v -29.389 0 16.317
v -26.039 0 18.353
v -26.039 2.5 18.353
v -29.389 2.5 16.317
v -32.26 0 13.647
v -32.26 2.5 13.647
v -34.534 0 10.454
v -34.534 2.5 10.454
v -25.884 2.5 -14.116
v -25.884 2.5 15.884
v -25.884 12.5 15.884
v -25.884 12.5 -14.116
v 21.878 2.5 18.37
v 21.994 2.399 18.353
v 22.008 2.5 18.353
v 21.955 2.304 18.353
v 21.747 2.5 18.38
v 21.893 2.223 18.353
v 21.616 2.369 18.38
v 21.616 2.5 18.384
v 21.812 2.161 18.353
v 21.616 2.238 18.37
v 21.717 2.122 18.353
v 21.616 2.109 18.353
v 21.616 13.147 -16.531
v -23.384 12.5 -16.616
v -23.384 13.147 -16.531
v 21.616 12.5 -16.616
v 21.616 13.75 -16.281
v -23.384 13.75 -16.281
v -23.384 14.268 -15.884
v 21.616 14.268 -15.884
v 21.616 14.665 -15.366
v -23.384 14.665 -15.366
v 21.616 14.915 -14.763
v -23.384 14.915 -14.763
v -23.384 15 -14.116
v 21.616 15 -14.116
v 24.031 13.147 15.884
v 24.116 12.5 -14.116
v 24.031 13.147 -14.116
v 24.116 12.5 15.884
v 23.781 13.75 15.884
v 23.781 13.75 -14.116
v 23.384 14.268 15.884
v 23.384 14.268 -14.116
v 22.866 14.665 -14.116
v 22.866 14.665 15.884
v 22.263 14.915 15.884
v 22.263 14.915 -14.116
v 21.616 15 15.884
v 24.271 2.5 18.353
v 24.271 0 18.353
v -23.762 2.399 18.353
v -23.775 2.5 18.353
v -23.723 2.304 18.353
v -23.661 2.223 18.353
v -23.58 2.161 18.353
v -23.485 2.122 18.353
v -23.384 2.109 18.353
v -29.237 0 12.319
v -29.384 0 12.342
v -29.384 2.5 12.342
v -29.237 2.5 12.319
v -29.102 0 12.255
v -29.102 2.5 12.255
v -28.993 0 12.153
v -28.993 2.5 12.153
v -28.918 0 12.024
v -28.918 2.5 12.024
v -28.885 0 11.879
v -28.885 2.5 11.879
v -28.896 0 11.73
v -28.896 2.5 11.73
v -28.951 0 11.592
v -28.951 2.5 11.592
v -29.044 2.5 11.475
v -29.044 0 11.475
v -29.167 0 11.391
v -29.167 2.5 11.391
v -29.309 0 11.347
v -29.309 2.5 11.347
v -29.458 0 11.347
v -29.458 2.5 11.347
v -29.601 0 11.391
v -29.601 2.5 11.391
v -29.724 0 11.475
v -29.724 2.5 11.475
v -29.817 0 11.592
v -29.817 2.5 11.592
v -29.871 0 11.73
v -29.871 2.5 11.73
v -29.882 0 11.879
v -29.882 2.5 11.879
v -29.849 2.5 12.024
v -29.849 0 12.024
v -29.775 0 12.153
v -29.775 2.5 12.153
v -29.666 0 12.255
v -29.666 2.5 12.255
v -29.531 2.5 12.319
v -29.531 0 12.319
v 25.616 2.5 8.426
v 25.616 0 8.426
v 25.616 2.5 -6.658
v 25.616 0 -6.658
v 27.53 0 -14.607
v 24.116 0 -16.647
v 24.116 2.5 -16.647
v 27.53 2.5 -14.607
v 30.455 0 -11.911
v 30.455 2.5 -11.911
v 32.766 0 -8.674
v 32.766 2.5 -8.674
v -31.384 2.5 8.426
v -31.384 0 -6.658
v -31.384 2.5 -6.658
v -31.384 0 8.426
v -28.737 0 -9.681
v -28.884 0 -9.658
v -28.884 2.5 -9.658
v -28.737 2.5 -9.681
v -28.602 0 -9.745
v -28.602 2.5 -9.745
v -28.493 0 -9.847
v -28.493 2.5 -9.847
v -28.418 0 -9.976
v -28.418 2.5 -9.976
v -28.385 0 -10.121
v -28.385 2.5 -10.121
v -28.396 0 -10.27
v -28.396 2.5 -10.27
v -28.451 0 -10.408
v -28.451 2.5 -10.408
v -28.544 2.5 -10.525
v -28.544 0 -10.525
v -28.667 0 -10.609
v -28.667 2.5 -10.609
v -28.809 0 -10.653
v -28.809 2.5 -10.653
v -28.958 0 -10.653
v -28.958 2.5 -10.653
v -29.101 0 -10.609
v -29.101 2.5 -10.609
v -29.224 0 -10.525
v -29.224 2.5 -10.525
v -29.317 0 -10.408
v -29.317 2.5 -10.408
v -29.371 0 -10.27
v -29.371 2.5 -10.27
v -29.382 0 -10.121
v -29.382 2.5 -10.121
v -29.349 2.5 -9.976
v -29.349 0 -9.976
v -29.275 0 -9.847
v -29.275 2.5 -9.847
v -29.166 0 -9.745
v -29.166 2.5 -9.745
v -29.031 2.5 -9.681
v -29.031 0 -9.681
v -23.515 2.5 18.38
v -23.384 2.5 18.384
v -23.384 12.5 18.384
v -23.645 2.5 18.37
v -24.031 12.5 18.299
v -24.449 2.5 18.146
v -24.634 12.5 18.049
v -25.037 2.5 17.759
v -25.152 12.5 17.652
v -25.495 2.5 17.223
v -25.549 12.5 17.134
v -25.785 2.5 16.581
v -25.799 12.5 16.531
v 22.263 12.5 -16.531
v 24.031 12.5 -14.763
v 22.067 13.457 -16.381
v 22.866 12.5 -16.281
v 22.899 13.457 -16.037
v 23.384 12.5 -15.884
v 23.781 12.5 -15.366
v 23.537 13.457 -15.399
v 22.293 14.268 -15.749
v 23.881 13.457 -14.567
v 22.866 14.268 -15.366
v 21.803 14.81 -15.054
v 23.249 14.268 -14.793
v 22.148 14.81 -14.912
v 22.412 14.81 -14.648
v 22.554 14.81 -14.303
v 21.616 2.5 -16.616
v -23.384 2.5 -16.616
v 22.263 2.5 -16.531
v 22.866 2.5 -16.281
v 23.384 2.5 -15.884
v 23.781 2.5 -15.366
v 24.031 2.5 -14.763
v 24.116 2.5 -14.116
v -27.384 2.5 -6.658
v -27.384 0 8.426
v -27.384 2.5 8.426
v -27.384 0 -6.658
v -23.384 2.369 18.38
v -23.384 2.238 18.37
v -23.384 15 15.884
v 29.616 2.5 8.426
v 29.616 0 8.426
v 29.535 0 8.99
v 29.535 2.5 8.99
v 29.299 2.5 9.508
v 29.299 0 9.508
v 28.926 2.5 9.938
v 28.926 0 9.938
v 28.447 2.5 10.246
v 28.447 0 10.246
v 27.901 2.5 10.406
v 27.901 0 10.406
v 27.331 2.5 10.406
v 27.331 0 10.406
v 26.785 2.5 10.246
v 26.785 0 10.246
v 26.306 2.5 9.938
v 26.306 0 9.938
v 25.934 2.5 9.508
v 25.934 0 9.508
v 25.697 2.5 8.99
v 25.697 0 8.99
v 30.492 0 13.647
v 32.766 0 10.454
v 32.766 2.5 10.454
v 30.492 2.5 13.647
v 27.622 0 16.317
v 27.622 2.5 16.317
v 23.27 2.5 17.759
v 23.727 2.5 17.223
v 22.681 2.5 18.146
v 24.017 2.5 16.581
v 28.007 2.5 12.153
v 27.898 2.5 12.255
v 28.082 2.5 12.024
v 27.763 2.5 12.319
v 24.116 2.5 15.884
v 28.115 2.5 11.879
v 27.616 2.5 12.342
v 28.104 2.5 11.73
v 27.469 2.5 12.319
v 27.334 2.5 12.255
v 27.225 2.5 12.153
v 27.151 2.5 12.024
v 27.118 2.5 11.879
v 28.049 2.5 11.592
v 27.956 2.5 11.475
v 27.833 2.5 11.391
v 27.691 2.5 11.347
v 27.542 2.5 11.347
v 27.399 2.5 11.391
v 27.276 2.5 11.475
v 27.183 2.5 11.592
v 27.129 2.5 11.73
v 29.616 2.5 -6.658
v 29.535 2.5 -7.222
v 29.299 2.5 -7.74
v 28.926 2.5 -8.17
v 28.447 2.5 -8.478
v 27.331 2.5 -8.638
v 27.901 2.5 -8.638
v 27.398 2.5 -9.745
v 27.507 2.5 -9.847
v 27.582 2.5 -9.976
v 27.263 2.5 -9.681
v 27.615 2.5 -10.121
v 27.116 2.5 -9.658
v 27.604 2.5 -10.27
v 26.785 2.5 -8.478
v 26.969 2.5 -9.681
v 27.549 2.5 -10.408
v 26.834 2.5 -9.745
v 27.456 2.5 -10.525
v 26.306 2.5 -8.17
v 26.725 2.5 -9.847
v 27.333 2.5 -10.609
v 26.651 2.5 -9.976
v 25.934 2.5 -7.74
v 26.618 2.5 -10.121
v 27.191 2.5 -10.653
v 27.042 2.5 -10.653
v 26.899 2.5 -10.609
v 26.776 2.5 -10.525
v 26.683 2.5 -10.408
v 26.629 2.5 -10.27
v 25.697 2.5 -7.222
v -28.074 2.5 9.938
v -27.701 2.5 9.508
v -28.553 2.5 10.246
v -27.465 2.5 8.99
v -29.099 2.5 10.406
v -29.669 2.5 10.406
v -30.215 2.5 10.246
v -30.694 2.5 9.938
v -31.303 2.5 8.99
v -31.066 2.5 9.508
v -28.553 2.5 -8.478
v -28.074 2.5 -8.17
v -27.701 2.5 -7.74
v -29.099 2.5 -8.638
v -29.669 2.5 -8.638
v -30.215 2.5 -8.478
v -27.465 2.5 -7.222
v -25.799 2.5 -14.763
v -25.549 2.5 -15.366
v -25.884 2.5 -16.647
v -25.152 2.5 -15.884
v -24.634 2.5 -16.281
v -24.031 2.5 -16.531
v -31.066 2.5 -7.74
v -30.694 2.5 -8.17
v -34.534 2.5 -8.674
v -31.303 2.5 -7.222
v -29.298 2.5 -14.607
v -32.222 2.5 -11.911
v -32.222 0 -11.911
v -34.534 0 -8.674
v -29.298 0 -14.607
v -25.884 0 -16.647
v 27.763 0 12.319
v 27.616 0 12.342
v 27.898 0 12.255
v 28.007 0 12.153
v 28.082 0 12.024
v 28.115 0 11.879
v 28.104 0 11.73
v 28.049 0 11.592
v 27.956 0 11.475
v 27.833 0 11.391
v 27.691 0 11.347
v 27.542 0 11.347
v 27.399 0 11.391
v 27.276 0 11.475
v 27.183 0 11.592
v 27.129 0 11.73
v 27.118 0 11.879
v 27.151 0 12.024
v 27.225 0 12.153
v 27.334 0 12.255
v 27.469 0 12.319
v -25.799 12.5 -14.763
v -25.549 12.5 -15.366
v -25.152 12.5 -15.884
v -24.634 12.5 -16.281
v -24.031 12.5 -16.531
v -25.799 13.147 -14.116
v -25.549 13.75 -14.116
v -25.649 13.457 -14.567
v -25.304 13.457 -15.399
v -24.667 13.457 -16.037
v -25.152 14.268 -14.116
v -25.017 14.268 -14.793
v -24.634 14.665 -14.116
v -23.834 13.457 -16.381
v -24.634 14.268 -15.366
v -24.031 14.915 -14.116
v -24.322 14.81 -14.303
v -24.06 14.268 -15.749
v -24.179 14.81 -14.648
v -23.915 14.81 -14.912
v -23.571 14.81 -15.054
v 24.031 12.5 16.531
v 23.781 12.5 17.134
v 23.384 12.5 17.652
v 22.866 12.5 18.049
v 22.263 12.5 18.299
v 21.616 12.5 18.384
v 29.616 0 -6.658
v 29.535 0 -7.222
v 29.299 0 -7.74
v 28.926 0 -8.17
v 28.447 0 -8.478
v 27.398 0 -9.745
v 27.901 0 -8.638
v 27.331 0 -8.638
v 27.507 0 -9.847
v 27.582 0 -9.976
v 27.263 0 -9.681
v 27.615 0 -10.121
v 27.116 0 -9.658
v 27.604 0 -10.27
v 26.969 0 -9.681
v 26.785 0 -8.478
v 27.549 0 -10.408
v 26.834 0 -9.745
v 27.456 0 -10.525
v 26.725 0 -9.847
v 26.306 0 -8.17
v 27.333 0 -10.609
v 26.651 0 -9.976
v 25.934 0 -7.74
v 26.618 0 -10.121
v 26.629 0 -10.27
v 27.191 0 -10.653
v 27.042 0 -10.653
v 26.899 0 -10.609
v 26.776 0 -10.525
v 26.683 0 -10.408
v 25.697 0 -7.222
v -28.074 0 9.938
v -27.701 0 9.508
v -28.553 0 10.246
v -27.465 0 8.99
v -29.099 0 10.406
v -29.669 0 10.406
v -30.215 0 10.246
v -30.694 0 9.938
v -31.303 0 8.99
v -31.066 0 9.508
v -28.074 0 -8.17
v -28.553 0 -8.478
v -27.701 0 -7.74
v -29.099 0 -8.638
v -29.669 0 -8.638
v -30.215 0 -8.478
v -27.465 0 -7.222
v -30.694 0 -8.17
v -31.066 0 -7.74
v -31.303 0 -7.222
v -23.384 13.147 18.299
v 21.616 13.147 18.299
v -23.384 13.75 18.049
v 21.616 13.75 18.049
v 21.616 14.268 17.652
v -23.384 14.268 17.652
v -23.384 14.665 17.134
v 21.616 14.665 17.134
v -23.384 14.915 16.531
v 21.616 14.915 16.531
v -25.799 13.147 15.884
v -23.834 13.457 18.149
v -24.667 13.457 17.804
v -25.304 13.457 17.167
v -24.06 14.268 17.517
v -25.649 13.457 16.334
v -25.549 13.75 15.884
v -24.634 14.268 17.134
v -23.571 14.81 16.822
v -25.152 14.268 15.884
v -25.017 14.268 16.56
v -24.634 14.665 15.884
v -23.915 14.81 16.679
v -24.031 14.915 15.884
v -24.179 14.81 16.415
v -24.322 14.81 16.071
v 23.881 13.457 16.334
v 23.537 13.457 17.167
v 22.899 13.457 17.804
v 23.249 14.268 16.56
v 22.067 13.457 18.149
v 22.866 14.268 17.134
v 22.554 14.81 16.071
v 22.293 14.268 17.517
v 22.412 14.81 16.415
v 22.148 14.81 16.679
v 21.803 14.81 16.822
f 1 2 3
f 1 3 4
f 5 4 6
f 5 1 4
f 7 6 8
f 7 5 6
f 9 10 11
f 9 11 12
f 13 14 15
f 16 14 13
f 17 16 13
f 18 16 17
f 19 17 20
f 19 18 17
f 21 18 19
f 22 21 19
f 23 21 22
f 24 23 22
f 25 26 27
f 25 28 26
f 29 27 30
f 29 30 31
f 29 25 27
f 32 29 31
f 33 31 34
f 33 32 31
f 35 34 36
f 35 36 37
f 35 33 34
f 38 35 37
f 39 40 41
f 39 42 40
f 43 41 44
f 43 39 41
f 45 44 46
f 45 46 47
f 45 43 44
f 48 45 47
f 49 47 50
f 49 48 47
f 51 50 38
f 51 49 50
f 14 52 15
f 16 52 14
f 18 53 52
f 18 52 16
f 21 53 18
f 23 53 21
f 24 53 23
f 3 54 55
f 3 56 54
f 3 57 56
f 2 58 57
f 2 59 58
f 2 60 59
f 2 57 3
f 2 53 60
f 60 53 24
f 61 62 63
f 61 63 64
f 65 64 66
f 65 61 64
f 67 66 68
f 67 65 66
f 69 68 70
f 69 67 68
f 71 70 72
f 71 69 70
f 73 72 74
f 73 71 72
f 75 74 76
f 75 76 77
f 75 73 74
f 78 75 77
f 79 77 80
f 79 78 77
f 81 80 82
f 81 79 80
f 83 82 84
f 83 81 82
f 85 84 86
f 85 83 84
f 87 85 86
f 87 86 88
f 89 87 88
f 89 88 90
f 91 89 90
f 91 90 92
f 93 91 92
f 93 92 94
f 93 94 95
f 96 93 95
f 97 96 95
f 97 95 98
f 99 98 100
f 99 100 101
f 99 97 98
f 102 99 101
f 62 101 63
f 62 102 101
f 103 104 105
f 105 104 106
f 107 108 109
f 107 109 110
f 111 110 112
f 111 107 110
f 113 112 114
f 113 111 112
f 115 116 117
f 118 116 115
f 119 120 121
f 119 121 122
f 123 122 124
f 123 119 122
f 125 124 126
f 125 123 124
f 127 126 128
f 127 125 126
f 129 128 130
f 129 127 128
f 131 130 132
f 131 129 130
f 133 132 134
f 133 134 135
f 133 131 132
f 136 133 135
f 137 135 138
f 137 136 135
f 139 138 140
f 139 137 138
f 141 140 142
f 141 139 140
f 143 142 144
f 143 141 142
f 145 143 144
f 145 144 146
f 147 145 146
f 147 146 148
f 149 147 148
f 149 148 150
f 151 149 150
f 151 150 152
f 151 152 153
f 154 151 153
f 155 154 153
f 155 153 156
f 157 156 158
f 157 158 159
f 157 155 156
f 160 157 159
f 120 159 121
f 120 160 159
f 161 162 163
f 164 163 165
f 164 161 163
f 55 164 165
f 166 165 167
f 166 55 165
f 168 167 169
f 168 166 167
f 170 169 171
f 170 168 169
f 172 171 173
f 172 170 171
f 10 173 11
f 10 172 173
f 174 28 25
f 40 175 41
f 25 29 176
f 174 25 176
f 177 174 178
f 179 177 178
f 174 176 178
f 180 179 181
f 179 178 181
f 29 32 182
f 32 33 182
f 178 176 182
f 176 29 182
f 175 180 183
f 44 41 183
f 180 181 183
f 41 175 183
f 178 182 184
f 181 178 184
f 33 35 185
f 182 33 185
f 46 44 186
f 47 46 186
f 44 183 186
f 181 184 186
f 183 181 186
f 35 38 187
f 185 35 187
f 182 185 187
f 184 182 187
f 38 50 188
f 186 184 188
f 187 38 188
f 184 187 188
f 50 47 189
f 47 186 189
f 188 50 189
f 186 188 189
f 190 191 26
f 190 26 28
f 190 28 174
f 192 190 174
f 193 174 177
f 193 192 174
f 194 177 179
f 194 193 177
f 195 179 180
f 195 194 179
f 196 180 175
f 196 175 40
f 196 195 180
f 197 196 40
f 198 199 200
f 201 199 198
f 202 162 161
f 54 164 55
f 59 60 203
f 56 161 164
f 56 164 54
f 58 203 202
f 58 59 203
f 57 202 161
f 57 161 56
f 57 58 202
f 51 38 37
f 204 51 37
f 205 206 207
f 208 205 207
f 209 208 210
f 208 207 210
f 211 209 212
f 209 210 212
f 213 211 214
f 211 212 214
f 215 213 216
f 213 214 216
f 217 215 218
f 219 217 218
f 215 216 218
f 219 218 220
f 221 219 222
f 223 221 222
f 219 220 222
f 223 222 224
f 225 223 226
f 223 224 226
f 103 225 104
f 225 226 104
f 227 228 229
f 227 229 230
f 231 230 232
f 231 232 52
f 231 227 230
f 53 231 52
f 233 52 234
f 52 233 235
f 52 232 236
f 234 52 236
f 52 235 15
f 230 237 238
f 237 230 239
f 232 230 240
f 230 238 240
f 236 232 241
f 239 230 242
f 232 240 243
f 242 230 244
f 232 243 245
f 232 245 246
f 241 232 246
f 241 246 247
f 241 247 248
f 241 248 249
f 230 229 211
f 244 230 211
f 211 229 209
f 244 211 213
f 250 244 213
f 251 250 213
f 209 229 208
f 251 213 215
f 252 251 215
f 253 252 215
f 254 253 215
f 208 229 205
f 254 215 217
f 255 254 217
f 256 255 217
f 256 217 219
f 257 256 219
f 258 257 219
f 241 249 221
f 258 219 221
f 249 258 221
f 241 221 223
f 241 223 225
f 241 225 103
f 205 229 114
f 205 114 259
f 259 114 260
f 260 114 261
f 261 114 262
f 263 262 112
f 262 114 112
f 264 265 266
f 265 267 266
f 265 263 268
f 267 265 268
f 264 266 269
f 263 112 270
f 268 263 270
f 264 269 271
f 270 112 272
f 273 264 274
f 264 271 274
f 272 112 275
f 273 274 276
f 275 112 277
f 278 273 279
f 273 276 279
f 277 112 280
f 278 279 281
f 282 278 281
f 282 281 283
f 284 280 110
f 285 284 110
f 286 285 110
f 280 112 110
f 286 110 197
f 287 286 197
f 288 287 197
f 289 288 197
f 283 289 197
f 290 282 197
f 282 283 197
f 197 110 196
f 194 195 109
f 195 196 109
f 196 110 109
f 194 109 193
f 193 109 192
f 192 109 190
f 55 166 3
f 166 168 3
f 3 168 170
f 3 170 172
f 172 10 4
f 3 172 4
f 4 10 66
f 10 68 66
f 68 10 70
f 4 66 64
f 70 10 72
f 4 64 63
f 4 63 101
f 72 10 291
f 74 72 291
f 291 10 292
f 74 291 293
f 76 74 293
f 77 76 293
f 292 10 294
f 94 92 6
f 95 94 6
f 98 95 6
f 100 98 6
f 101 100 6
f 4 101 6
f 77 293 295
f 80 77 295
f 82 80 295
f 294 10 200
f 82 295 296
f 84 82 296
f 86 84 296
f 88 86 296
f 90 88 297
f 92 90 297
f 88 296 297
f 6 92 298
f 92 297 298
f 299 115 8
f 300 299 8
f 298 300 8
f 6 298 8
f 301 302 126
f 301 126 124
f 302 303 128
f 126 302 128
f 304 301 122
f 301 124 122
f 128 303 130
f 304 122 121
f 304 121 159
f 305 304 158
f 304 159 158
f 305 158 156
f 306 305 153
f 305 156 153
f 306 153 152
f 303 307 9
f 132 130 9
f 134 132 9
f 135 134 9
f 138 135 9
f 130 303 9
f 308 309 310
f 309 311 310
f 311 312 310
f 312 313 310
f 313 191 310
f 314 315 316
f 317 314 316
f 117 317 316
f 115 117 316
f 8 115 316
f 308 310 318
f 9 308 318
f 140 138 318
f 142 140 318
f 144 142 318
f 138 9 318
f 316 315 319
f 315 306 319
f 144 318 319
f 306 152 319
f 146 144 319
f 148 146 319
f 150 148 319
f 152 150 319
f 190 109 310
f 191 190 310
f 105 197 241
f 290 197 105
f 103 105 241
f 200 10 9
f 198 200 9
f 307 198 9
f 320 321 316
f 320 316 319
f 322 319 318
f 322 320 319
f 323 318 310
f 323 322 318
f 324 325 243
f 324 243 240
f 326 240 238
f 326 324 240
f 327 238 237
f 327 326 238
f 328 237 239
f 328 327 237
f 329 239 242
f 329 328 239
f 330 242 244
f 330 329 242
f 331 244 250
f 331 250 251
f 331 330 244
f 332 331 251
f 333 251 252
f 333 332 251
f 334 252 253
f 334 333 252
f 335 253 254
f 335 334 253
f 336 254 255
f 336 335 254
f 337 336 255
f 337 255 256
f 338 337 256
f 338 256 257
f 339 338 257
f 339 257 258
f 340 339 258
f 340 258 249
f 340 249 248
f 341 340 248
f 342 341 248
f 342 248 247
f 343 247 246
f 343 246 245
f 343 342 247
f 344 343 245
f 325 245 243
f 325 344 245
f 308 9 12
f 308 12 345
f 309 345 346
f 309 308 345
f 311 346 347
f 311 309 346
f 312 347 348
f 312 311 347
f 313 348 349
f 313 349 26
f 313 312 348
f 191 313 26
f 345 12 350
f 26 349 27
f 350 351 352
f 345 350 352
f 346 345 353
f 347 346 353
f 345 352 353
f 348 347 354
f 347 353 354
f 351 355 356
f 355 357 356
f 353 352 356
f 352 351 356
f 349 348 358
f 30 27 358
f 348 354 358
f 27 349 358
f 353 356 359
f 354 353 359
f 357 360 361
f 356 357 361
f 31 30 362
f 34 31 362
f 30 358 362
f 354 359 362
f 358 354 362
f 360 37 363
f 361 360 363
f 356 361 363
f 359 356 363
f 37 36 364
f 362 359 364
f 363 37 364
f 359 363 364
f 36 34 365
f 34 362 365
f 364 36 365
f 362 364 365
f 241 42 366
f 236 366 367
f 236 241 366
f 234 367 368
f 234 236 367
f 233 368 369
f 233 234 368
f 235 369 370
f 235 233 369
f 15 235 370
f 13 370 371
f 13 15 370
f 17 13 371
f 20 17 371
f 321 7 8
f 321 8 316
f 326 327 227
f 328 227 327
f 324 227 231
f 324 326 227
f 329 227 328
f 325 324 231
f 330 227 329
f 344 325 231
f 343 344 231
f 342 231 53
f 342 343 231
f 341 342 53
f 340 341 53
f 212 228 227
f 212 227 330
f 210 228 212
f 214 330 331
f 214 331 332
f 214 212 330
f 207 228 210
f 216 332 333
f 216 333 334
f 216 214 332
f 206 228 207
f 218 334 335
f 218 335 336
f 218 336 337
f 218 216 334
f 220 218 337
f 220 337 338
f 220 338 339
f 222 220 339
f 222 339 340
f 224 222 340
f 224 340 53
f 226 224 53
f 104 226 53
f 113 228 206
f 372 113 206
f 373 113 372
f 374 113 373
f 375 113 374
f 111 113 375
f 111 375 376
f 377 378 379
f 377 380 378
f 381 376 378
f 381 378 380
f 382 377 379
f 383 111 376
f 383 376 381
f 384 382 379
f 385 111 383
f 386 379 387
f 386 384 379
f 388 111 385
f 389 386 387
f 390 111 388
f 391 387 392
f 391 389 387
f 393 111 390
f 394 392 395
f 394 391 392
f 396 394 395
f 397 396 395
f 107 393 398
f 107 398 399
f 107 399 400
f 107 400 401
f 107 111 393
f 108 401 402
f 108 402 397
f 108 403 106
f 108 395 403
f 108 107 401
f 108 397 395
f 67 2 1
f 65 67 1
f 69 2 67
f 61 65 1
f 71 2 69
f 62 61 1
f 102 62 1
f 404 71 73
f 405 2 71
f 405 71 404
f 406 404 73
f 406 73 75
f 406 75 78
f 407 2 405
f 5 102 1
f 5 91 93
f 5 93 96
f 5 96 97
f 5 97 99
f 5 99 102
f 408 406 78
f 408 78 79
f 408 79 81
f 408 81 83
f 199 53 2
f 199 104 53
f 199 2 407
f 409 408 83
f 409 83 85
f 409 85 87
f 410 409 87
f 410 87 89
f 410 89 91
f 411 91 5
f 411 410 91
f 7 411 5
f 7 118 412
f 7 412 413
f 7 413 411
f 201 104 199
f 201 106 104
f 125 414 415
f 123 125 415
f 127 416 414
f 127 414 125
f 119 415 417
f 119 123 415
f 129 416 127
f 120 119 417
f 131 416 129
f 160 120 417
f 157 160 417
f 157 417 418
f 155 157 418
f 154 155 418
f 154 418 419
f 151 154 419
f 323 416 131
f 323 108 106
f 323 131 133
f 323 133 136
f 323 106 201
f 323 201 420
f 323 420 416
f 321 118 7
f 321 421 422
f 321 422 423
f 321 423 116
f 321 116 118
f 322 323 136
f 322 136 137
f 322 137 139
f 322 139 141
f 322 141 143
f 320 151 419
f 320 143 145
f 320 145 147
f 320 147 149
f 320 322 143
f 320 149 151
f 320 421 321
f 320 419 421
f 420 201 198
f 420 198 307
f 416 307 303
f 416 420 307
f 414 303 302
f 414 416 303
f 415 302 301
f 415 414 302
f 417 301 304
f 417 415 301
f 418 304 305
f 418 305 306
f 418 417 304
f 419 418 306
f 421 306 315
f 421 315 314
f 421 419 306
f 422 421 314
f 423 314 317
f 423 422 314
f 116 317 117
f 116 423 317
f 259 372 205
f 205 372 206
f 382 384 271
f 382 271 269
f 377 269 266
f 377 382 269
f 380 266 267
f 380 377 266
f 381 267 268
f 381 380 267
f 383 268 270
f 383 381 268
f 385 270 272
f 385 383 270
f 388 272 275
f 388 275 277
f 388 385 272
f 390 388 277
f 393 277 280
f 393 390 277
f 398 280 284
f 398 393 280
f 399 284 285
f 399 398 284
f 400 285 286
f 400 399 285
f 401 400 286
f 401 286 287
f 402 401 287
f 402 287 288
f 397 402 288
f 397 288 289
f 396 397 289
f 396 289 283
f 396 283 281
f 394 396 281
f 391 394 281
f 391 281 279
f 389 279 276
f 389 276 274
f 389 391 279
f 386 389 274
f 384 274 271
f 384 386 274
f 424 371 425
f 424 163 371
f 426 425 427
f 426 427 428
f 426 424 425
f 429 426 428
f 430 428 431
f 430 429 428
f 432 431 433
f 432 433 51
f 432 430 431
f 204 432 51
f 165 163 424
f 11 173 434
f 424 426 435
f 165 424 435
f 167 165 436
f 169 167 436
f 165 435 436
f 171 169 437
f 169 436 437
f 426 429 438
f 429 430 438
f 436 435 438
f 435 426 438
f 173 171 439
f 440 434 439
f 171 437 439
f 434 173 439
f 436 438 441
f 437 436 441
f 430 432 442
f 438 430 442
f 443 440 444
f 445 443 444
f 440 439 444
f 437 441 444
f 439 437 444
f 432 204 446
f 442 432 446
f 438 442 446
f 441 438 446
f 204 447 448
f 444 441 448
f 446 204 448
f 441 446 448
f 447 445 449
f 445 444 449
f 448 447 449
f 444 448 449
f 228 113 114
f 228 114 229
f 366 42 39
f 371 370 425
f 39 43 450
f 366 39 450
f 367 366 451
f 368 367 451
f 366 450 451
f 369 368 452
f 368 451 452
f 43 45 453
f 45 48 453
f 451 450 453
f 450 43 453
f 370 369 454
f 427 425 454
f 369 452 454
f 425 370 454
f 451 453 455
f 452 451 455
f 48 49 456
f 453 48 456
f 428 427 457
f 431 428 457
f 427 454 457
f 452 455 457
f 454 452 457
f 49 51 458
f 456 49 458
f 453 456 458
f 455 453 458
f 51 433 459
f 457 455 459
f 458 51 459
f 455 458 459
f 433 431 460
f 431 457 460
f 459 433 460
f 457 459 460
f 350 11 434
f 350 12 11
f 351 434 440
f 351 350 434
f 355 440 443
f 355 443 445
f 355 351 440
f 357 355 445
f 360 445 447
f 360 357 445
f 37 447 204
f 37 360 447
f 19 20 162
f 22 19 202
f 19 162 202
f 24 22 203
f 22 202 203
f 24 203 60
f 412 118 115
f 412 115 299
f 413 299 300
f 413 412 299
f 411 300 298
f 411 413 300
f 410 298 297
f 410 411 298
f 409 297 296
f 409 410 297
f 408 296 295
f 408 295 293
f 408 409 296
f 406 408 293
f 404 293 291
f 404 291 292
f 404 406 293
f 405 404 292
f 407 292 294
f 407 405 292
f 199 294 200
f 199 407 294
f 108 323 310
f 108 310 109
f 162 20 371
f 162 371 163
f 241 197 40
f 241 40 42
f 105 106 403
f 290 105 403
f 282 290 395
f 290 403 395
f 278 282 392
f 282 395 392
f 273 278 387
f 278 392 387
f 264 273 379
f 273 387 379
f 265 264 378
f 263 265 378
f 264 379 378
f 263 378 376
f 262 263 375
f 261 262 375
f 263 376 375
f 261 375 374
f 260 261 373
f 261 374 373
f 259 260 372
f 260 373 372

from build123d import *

# Parameters (mm, degrees)
BOSS_EXTRUDE2_DEPTH = 15
FILLET2_R           = 2.5
SKETCH3_R           = 0.5
BOSS_EXTRUDE4_DEPTH = 2.5


with BuildPart() as part:
    # Sketch1 → Boss-Extrude2 (new body)
    with BuildSketch(Plane(origin=(0, 0, 0), x_dir=(1, 0, 0), z_dir=(0, 1, 0))):
        with BuildLine():
            Line((-23.383883476, 16.616116524), (21.616116524, 16.616116524))
            ThreePointArc((21.616116524, 16.616116524), (23.383883476, 15.883883476), (24.116116524, 14.116116524))
            Line((24.116116524, 14.116116524), (24.116116524, -15.883883476))
            ThreePointArc((24.116116524, -15.883883476), (23.383883476, -17.651650429), (21.616116524, -18.383883476))
            Line((21.616116524, -18.383883476), (-23.383883476, -18.383883476))
            ThreePointArc((-23.383883476, -18.383883476), (-25.151650429, -17.651650429), (-25.883883476, -15.883883476))
            Line((-25.883883476, -15.883883476), (-25.883883476, 14.116116524))
            ThreePointArc((-25.883883476, 14.116116524), (-25.151650429, 15.883883476), (-23.383883476, 16.616116524))
        make_face()
    extrude(amount=BOSS_EXTRUDE2_DEPTH)

    # Fillet2
    fillet2_edges = [part.edges().sort_by_distance(p)[0] for p in [
        (-25.151650429, 15, 17.651650429),
        (-25.883883476, 0, 0.883883476),
        (-25.151650429, 0, -15.883883476),
        (-0.883883476, 15, 18.383883476),
        (23.383883476, 15, 17.651650429),
        (24.116116524, 15, 0.883883476),
        (23.383883476, 15, -15.883883476),
        (-0.883883476, 15, -16.616116524),
        (-25.151650429, 15, -15.883883476),
        (-25.883883476, 15, 0.883883476),
        (-0.883883476, 0, -16.616116524),
        (23.383883476, 0, -15.883883476),
        (24.116116524, 0, 0.883883476),
        (23.383883476, 0, 17.651650429),
        (-0.883883476, 0, 18.383883476),
        (-25.151650429, 0, 17.651650429),
    ]]
    fillet(fillet2_edges, radius=FILLET2_R)

    # Sketch3 → Boss-Extrude4 (add)
    with BuildSketch(Plane(origin=(0, 0, 0), x_dir=(1, 0, 0), z_dir=(0, 1, 0))):
        with BuildLine():
            Line((-25.883883476, 16.646945133), (24.116116524, 16.646945133))
            ThreePointArc((24.116116524, 16.646945133), (29.061870418, 13.334132498), (32.766116524, 8.674328862))
            Line((32.766116524, 8.674328862), (32.766116524, -10.453501419))
            ThreePointArc((32.766116524, -10.453501419), (29.124788001, -15.055056138), (24.271254893, -18.353054867))
            Line((24.271254893, -18.353054867), (-26.039021846, -18.353054867))
            ThreePointArc((-26.039021846, -18.353054867), (-30.892554954, -15.055056138), (-34.533883476, -10.453501419))
            Line((-34.533883476, -10.453501419), (-34.533883476, 8.674328862))
            ThreePointArc((-34.533883476, 8.674328862), (-30.829637371, 13.334132498), (-25.883883476, 16.646945133))
        make_face()
        with Locations(Location((-28.883883476, 10.158483361, 0), (0, 0, 270))):
            Circle(SKETCH3_R, mode=Mode.SUBTRACT)
        with Locations(Location((-29.383883476, -11.841516639, 0), (0, 0, 270))):
            Circle(SKETCH3_R, mode=Mode.SUBTRACT)
        with Locations(Location((27.616116524, -11.841516639, 0), (0, 0, 270))):
            Circle(SKETCH3_R, mode=Mode.SUBTRACT)
        with Locations(Location((27.116116524, 10.158483361, 0), (0, 0, 270))):
            Circle(SKETCH3_R, mode=Mode.SUBTRACT)
        with BuildLine():
            Line((29.616116524, 6.658483361), (29.616116524, -8.426250314))
            ThreePointArc((29.616116524, -8.426250314), (27.616116524, -10.426250314), (25.616116524, -8.426250314))
            Line((25.616116524, -8.426250314), (25.616116524, 6.658483361))
            ThreePointArc((25.616116524, 6.658483361), (27.616116524, 8.658483361), (29.616116524, 6.658483361))
        make_face(mode=Mode.SUBTRACT)
        with BuildLine():
            Line((-31.383883476, 6.658483361), (-31.383883476, -8.426250314))
            ThreePointArc((-31.383883476, -8.426250314), (-29.383883476, -10.426250314), (-27.383883476, -8.426250314))
            Line((-27.383883476, -8.426250314), (-27.383883476, 6.658483361))
            ThreePointArc((-27.383883476, 6.658483361), (-29.383883476, 8.658483361), (-31.383883476, 6.658483361))
        make_face(mode=Mode.SUBTRACT)
    extrude(amount=BOSS_EXTRUDE4_DEPTH)


solid = part.part
